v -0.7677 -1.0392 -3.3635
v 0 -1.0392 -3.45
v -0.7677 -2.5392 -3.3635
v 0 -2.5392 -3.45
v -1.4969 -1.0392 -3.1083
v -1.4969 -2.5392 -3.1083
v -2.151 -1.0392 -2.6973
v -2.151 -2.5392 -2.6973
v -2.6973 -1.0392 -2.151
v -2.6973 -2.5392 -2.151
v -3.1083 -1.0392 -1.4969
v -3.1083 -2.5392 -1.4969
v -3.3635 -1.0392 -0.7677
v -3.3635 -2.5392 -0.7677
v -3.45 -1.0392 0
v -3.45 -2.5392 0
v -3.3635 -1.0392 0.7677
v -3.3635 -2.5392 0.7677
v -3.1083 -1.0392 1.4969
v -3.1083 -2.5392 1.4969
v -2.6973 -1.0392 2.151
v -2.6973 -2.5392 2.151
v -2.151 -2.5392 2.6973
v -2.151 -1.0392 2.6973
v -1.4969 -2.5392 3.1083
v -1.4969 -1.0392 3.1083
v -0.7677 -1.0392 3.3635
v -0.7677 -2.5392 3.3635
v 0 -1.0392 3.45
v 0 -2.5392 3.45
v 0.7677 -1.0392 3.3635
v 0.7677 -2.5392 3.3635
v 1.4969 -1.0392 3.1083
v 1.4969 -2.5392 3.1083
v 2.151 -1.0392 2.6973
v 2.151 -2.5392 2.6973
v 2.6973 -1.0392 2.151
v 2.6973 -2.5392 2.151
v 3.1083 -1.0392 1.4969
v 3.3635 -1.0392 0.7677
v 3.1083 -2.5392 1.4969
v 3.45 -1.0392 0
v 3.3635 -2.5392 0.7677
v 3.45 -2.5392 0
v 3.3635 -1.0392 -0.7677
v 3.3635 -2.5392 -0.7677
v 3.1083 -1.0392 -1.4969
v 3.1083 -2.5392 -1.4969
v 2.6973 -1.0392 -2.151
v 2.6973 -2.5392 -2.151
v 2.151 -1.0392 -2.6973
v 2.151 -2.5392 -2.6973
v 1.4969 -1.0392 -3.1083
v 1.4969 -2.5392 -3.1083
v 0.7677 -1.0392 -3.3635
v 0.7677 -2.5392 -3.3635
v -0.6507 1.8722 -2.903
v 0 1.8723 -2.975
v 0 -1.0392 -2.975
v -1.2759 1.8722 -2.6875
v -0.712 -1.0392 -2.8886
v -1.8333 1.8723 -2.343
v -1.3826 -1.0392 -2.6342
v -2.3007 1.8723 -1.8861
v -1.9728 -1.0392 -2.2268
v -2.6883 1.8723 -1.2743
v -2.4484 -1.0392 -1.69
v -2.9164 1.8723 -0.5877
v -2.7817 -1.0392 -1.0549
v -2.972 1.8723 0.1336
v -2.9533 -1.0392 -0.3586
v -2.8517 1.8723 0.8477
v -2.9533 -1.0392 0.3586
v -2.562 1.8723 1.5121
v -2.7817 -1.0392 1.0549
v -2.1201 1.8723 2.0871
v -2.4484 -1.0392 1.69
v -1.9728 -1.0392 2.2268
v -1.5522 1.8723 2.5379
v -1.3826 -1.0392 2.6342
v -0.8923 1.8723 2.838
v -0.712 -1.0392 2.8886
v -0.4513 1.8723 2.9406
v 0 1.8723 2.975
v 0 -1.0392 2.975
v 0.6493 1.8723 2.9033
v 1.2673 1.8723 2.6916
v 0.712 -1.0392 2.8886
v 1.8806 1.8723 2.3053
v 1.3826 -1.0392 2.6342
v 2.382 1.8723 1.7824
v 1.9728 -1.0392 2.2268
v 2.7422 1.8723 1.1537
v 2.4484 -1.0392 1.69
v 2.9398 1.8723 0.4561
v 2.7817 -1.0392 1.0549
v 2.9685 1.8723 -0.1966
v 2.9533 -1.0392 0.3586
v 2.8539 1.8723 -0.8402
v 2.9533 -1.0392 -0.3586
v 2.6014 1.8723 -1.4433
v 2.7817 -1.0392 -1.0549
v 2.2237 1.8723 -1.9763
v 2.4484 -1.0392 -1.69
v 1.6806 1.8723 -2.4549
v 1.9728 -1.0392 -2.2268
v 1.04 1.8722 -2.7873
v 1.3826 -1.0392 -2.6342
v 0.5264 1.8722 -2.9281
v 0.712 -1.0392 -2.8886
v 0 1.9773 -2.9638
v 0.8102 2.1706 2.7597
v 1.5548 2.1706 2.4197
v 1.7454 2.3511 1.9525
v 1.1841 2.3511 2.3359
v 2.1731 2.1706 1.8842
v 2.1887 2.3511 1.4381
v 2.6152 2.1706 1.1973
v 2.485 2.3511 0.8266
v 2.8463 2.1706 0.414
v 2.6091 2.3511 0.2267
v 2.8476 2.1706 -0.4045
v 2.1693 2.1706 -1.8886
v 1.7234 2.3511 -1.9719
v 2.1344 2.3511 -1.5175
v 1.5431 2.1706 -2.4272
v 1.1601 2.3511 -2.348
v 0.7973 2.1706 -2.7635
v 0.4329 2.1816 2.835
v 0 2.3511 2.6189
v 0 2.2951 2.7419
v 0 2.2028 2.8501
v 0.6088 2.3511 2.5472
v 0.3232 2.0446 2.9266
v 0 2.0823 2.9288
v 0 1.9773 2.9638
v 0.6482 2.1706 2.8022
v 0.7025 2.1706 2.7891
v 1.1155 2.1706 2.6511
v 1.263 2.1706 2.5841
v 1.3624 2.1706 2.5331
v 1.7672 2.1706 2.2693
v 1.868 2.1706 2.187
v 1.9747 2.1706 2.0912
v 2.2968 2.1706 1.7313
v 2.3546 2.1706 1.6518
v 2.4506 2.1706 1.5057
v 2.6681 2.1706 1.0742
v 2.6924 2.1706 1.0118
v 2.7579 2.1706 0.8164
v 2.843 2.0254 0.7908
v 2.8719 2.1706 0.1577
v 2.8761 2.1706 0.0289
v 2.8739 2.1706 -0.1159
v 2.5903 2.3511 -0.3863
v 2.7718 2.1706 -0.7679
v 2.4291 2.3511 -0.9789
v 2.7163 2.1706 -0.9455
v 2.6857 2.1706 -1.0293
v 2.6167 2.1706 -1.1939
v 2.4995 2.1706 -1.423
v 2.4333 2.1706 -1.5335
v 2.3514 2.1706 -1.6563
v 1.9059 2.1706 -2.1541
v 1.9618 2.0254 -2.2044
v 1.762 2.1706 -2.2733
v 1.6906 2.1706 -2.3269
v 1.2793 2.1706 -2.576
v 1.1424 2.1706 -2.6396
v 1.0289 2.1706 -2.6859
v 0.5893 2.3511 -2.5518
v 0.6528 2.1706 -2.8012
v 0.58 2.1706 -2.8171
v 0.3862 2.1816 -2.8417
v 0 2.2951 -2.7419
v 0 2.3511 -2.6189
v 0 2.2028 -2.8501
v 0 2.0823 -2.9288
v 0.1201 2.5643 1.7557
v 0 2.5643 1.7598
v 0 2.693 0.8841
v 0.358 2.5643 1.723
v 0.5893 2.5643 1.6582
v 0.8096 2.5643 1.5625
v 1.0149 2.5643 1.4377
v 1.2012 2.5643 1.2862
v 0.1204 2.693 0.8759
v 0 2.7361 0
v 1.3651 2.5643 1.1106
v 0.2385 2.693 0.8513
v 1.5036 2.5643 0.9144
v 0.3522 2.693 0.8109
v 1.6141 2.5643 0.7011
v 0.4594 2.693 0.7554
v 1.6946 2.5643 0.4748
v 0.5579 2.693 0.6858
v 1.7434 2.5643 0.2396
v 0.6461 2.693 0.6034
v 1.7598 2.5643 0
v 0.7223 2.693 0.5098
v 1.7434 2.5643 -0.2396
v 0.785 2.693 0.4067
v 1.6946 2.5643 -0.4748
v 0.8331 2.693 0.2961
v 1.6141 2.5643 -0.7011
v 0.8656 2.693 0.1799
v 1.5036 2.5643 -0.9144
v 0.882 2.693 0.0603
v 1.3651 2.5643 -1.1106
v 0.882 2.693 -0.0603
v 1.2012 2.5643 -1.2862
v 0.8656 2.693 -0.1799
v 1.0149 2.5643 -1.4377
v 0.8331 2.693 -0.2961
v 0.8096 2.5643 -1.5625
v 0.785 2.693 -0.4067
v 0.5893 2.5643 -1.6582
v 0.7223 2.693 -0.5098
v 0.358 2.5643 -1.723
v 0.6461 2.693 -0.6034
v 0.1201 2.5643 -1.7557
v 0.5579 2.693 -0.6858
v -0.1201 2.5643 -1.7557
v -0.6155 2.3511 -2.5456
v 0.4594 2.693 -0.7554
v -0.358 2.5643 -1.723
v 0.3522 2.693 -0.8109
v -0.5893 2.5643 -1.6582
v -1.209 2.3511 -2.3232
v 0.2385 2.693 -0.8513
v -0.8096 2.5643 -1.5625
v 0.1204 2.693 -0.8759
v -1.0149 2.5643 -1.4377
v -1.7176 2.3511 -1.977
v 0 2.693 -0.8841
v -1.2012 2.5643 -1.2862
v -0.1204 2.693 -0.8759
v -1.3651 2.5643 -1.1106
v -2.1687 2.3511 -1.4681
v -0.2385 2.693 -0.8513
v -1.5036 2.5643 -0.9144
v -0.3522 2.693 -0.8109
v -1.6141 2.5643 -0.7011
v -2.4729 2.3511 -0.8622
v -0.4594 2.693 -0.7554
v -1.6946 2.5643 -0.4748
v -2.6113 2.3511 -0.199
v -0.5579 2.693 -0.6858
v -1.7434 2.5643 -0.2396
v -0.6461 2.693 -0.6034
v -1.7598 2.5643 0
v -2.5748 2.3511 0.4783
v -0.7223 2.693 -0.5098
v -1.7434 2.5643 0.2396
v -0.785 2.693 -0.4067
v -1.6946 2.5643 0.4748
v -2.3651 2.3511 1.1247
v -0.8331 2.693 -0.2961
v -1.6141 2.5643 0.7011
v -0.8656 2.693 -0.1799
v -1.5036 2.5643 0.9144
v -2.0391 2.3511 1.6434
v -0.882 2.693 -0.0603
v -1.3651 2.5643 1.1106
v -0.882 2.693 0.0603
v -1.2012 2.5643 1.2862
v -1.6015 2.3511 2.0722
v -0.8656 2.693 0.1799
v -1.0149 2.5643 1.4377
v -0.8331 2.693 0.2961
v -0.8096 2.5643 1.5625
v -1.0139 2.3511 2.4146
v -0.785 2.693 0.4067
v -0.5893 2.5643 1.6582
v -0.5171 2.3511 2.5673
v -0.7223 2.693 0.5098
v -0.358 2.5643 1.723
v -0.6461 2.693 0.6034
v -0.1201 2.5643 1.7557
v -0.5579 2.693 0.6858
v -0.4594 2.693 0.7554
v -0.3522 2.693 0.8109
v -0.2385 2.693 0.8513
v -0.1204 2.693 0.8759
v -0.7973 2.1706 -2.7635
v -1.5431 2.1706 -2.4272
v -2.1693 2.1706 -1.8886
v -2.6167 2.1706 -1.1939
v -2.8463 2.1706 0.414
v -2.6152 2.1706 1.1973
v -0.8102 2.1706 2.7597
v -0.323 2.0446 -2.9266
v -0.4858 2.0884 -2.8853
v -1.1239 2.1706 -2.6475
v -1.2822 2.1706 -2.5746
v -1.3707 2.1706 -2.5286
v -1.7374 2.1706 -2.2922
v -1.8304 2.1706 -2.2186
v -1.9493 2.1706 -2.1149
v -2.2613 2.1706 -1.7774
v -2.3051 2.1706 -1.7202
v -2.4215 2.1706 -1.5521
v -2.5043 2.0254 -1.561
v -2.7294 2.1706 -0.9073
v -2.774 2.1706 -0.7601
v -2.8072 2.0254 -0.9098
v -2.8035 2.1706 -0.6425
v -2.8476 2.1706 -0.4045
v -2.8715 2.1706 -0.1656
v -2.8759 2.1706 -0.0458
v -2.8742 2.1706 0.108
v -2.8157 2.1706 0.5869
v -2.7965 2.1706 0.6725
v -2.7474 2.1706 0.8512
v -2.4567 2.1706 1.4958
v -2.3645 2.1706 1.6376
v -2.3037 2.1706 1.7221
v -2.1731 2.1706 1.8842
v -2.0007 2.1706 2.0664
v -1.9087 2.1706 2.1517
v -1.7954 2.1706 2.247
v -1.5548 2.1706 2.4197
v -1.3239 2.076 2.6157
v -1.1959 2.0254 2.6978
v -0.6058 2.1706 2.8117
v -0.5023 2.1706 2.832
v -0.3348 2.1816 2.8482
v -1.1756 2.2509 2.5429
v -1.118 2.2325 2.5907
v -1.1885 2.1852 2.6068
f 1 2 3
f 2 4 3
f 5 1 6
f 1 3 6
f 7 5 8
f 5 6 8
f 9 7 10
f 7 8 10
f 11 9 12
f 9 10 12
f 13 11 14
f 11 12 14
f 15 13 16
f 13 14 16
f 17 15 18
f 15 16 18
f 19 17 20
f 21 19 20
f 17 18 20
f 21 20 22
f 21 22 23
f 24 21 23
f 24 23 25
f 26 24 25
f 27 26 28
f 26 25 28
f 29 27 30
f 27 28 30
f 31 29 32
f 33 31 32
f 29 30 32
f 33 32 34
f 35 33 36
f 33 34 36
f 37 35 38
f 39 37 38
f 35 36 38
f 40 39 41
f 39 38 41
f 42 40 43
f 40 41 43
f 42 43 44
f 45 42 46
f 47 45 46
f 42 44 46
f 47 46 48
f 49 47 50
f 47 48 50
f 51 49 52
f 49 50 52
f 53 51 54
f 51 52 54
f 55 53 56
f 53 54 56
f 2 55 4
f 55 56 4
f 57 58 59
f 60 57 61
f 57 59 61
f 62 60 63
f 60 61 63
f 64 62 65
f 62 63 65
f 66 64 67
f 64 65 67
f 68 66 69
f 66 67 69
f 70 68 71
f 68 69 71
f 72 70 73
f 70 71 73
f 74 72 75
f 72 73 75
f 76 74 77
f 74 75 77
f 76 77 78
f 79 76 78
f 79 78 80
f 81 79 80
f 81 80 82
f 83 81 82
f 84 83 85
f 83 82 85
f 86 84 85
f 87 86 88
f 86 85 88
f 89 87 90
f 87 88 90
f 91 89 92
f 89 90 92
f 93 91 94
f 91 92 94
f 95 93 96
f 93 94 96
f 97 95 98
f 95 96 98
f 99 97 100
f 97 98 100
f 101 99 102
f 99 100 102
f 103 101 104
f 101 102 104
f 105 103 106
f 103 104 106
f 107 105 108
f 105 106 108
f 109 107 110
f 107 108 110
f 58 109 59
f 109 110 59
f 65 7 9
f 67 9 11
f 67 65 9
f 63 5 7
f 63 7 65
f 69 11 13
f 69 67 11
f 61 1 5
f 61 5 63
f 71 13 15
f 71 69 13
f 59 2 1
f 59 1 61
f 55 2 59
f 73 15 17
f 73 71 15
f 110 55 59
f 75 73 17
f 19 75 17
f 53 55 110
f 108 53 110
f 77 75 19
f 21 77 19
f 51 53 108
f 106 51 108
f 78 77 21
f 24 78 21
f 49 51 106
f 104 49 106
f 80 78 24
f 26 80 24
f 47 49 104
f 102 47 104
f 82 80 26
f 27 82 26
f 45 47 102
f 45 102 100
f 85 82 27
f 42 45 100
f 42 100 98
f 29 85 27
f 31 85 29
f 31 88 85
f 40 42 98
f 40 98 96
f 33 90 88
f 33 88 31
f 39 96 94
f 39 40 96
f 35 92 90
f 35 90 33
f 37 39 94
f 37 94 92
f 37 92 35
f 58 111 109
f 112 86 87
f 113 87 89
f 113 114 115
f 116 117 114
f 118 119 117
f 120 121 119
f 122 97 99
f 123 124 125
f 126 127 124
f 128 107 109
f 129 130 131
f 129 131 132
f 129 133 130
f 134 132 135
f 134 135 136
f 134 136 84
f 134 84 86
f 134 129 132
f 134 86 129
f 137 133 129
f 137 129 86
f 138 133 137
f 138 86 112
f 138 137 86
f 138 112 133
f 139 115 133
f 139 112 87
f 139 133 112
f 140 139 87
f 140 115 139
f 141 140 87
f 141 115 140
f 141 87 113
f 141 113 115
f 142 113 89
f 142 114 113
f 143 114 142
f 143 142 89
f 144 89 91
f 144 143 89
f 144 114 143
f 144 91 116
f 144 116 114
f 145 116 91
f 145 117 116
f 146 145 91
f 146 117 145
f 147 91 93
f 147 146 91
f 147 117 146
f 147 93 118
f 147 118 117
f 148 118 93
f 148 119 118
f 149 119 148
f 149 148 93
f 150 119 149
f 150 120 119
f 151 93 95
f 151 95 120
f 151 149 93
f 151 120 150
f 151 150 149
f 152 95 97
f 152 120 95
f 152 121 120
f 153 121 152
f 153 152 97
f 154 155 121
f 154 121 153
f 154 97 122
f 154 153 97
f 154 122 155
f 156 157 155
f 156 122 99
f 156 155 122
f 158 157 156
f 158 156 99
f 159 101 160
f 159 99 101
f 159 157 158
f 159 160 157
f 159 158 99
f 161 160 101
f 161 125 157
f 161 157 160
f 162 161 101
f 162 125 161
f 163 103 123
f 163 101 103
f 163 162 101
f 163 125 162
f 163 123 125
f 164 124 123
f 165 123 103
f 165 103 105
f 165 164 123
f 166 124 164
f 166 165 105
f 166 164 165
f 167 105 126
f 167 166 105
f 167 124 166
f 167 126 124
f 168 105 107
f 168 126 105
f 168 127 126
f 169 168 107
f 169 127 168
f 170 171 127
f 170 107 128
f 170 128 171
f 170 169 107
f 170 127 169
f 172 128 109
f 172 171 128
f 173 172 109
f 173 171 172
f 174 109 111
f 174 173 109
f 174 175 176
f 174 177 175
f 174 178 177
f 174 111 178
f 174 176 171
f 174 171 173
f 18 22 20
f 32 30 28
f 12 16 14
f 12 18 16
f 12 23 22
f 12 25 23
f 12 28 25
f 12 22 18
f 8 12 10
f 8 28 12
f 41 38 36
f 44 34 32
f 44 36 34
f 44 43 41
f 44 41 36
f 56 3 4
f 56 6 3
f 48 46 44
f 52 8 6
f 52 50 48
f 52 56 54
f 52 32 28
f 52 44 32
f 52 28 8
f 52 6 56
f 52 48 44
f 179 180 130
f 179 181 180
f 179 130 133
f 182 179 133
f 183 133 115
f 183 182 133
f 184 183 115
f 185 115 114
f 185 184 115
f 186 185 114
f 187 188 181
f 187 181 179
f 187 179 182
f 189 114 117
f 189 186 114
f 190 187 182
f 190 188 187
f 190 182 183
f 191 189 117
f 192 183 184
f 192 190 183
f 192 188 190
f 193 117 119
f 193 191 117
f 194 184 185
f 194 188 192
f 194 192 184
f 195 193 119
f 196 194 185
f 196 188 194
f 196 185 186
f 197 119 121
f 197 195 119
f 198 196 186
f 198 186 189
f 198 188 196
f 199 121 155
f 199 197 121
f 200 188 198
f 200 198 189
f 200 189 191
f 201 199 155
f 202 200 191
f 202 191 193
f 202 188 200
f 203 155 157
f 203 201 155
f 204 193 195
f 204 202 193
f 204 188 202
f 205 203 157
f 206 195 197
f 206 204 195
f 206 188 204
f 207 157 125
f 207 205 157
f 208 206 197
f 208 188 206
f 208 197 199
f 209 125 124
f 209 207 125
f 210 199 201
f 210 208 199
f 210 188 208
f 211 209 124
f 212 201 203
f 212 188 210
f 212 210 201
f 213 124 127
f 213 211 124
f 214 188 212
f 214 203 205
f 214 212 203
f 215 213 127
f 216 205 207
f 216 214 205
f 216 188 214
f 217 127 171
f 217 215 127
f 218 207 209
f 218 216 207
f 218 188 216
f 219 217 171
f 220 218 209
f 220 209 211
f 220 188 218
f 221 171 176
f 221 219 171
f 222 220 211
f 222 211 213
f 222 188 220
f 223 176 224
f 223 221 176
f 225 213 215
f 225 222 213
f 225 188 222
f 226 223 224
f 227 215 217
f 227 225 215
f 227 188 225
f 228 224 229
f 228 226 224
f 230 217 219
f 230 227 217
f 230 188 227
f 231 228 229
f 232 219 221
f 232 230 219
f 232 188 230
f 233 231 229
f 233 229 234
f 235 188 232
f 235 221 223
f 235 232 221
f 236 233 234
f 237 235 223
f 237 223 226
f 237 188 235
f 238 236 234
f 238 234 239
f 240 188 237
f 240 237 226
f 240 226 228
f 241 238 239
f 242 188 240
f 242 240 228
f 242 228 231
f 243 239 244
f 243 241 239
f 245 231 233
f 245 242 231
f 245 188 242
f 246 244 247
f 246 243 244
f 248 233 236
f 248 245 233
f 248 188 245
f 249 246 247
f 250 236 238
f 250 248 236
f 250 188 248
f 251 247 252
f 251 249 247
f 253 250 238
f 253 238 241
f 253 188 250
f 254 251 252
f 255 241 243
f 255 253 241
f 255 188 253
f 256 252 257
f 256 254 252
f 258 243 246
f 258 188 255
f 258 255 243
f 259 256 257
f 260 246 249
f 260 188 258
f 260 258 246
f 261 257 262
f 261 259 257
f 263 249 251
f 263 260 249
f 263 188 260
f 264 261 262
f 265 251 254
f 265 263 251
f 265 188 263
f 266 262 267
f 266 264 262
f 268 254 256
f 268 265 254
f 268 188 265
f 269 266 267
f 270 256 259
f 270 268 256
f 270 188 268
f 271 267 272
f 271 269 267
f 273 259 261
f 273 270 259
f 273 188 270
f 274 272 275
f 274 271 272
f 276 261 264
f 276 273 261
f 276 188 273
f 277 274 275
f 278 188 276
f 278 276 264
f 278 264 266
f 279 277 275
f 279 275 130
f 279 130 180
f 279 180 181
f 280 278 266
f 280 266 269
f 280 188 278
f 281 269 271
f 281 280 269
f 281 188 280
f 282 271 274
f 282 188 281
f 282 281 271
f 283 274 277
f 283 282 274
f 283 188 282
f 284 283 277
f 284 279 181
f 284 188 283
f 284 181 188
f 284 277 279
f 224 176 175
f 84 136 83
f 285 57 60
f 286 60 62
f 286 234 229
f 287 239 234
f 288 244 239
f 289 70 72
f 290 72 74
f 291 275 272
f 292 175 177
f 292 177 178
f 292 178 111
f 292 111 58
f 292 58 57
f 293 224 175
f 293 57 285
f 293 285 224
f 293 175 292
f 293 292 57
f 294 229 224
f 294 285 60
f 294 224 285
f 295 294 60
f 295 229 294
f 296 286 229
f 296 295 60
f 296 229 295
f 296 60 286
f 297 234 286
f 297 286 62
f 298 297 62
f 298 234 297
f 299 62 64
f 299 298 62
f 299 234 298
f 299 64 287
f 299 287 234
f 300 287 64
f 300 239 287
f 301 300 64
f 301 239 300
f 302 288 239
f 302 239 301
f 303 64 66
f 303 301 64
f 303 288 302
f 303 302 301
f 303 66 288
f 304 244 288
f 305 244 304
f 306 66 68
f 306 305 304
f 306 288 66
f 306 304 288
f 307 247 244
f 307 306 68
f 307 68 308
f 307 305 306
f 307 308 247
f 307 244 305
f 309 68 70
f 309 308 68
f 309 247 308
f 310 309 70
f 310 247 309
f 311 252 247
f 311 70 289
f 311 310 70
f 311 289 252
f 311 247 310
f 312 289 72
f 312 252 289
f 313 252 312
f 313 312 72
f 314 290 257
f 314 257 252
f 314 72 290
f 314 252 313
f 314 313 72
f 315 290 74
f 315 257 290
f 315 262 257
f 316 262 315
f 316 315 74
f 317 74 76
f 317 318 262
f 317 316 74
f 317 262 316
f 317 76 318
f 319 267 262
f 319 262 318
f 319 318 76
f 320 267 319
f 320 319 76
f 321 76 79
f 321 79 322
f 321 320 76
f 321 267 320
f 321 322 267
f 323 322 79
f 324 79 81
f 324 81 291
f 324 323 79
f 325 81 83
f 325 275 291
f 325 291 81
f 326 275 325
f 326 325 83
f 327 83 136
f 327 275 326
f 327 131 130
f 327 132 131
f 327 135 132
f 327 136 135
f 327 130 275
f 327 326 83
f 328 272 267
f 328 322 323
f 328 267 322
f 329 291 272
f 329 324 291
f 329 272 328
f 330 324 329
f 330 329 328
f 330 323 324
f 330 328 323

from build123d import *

# Parameters (mm, degrees)
MOVE_FACE2_BY                   = 0.025
DOME1_FACE_RADIUS               = 2.975
DOME1_HEIGHT                    = 0.5
FILLET1_R                       = 0.5
SKETCH2_R                       = 0.75
BOSS_EXTRUDE1_DEPTH             = 3.45
SKETCH3_W                       = 4
SKETCH3_H                       = 1
EXTRUDE_THIN1_DEPTH             = 3.45
MOVE_FACE1_BY                   = 0.05
BOSS_EXTRUDE2_REACH             = 8.95
SKETCH4_R                       = 2
BOSS_EXTRUDE2_DIRECTION_2_REACH = 8.95


with BuildPart() as part:
    # Sketch1 → Revolve1 (revolve)
    with BuildSketch(Plane(origin=(0, 0, 0), x_dir=(0, 0, -1), z_dir=(1, 0, 0))):
        Polygon((0, 2.236067977), (3, 2.236067977), (3, -1.039151263), (3.5, -1.039151263), (3.5, -2.539151263), (2, -2.539151263), (2, 1.236067977), (0, 1.236067977), align=None)
    revolve(axis=Axis((0, 1.236067977, 0), (0, 1, 0)))

    # Move Face2: a curved face moved inward by 0.025
    add(Solid.thicken(part.faces().sort_by_distance((0, 0.598458357, 3))[0], -MOVE_FACE2_BY), mode=Mode.SUBTRACT)

    # Dome1: a dome of height H over a round flat face of radius A is a cap of a sphere of radius (A * A + H * H) / (2 * H)
    dome1_r = (DOME1_FACE_RADIUS * DOME1_FACE_RADIUS + DOME1_HEIGHT * DOME1_HEIGHT) / (2 * DOME1_HEIGHT)
    dome1_base = Plane((0, 2.236067977, 0), z_dir=(0, 1, 0))
    with Locations(dome1_base.offset(DOME1_HEIGHT - dome1_r)):
        dome1_ball = Sphere(dome1_r, mode=Mode.PRIVATE)
    add(split(dome1_ball, bisect_by=dome1_base, keep=Keep.TOP, mode=Mode.PRIVATE))

    # Fillet1
    fillet1_edges = [part.edges().sort_by_distance(p)[0] for p in [
        (2.975, 2.236067977, 0),
    ]]
    fillet(fillet1_edges, radius=FILLET1_R)

    # Sketch2 → Boss-Extrude1 (add)
    with BuildSketch(Plane.XZ.offset(-1.236067977)):
        with Locations(Location((0, 0, 0), (0, 0, 90))):
            Circle(SKETCH2_R)
    extrude(amount=BOSS_EXTRUDE1_DEPTH)

    # Sketch3 → Extrude-Thin1 (add)
    with BuildSketch(Plane.XZ.offset(2.213932023)):
        Rectangle(SKETCH3_W, SKETCH3_H)
    extrude(amount=-EXTRUDE_THIN1_DEPTH)

    # Move Face1: a curved face moved inward by 0.05
    add(Solid.thicken(part.faces().sort_by_distance((0, -1.789151263, 3.5))[0], -MOVE_FACE1_BY), mode=Mode.SUBTRACT)

    # Sketch4 → Boss-Extrude2 (add, up to next)
    with BuildSketch(Plane.XZ.offset(2.213932023), mode=Mode.PRIVATE) as boss_extrude2_sk1:
        Circle(SKETCH4_R)
    boss_extrude2_tool1 = extrude(boss_extrude2_sk1.sketch, amount=-BOSS_EXTRUDE2_REACH, mode=Mode.PRIVATE) - part.part
    add(boss_extrude2_tool1.solids().sort_by_distance((0, -2.213932, 0))[0])
    add(boss_extrude2_tool1.solids().sort_by_distance((0, -2.213932, 0))[1])

    # Boss-Extrude2 direction 2: up to this face of the body (flat: up to its plane)
    boss_extrude2_direction_2_end = Plane(part.part.faces().sort_by_distance((0, -2.539151263, 3.352419264))[0])
    # Sketch4 → Boss-Extrude2 direction 2 (add, up to the picked face)
    with BuildSketch(Plane.XZ.offset(2.213932023), mode=Mode.PRIVATE) as boss_extrude2_direction_2_sk1:
        Circle(SKETCH4_R)
    boss_extrude2_direction_2_tool1 = split(extrude(boss_extrude2_direction_2_sk1.sketch, amount=BOSS_EXTRUDE2_DIRECTION_2_REACH, mode=Mode.PRIVATE), bisect_by=boss_extrude2_direction_2_end, keep=Keep.BOTH, mode=Mode.PRIVATE)
    add(boss_extrude2_direction_2_tool1.solids().sort_by(Axis((0, -2.213932, 0), (0, -1, 0)))[0])


solid = part.part
